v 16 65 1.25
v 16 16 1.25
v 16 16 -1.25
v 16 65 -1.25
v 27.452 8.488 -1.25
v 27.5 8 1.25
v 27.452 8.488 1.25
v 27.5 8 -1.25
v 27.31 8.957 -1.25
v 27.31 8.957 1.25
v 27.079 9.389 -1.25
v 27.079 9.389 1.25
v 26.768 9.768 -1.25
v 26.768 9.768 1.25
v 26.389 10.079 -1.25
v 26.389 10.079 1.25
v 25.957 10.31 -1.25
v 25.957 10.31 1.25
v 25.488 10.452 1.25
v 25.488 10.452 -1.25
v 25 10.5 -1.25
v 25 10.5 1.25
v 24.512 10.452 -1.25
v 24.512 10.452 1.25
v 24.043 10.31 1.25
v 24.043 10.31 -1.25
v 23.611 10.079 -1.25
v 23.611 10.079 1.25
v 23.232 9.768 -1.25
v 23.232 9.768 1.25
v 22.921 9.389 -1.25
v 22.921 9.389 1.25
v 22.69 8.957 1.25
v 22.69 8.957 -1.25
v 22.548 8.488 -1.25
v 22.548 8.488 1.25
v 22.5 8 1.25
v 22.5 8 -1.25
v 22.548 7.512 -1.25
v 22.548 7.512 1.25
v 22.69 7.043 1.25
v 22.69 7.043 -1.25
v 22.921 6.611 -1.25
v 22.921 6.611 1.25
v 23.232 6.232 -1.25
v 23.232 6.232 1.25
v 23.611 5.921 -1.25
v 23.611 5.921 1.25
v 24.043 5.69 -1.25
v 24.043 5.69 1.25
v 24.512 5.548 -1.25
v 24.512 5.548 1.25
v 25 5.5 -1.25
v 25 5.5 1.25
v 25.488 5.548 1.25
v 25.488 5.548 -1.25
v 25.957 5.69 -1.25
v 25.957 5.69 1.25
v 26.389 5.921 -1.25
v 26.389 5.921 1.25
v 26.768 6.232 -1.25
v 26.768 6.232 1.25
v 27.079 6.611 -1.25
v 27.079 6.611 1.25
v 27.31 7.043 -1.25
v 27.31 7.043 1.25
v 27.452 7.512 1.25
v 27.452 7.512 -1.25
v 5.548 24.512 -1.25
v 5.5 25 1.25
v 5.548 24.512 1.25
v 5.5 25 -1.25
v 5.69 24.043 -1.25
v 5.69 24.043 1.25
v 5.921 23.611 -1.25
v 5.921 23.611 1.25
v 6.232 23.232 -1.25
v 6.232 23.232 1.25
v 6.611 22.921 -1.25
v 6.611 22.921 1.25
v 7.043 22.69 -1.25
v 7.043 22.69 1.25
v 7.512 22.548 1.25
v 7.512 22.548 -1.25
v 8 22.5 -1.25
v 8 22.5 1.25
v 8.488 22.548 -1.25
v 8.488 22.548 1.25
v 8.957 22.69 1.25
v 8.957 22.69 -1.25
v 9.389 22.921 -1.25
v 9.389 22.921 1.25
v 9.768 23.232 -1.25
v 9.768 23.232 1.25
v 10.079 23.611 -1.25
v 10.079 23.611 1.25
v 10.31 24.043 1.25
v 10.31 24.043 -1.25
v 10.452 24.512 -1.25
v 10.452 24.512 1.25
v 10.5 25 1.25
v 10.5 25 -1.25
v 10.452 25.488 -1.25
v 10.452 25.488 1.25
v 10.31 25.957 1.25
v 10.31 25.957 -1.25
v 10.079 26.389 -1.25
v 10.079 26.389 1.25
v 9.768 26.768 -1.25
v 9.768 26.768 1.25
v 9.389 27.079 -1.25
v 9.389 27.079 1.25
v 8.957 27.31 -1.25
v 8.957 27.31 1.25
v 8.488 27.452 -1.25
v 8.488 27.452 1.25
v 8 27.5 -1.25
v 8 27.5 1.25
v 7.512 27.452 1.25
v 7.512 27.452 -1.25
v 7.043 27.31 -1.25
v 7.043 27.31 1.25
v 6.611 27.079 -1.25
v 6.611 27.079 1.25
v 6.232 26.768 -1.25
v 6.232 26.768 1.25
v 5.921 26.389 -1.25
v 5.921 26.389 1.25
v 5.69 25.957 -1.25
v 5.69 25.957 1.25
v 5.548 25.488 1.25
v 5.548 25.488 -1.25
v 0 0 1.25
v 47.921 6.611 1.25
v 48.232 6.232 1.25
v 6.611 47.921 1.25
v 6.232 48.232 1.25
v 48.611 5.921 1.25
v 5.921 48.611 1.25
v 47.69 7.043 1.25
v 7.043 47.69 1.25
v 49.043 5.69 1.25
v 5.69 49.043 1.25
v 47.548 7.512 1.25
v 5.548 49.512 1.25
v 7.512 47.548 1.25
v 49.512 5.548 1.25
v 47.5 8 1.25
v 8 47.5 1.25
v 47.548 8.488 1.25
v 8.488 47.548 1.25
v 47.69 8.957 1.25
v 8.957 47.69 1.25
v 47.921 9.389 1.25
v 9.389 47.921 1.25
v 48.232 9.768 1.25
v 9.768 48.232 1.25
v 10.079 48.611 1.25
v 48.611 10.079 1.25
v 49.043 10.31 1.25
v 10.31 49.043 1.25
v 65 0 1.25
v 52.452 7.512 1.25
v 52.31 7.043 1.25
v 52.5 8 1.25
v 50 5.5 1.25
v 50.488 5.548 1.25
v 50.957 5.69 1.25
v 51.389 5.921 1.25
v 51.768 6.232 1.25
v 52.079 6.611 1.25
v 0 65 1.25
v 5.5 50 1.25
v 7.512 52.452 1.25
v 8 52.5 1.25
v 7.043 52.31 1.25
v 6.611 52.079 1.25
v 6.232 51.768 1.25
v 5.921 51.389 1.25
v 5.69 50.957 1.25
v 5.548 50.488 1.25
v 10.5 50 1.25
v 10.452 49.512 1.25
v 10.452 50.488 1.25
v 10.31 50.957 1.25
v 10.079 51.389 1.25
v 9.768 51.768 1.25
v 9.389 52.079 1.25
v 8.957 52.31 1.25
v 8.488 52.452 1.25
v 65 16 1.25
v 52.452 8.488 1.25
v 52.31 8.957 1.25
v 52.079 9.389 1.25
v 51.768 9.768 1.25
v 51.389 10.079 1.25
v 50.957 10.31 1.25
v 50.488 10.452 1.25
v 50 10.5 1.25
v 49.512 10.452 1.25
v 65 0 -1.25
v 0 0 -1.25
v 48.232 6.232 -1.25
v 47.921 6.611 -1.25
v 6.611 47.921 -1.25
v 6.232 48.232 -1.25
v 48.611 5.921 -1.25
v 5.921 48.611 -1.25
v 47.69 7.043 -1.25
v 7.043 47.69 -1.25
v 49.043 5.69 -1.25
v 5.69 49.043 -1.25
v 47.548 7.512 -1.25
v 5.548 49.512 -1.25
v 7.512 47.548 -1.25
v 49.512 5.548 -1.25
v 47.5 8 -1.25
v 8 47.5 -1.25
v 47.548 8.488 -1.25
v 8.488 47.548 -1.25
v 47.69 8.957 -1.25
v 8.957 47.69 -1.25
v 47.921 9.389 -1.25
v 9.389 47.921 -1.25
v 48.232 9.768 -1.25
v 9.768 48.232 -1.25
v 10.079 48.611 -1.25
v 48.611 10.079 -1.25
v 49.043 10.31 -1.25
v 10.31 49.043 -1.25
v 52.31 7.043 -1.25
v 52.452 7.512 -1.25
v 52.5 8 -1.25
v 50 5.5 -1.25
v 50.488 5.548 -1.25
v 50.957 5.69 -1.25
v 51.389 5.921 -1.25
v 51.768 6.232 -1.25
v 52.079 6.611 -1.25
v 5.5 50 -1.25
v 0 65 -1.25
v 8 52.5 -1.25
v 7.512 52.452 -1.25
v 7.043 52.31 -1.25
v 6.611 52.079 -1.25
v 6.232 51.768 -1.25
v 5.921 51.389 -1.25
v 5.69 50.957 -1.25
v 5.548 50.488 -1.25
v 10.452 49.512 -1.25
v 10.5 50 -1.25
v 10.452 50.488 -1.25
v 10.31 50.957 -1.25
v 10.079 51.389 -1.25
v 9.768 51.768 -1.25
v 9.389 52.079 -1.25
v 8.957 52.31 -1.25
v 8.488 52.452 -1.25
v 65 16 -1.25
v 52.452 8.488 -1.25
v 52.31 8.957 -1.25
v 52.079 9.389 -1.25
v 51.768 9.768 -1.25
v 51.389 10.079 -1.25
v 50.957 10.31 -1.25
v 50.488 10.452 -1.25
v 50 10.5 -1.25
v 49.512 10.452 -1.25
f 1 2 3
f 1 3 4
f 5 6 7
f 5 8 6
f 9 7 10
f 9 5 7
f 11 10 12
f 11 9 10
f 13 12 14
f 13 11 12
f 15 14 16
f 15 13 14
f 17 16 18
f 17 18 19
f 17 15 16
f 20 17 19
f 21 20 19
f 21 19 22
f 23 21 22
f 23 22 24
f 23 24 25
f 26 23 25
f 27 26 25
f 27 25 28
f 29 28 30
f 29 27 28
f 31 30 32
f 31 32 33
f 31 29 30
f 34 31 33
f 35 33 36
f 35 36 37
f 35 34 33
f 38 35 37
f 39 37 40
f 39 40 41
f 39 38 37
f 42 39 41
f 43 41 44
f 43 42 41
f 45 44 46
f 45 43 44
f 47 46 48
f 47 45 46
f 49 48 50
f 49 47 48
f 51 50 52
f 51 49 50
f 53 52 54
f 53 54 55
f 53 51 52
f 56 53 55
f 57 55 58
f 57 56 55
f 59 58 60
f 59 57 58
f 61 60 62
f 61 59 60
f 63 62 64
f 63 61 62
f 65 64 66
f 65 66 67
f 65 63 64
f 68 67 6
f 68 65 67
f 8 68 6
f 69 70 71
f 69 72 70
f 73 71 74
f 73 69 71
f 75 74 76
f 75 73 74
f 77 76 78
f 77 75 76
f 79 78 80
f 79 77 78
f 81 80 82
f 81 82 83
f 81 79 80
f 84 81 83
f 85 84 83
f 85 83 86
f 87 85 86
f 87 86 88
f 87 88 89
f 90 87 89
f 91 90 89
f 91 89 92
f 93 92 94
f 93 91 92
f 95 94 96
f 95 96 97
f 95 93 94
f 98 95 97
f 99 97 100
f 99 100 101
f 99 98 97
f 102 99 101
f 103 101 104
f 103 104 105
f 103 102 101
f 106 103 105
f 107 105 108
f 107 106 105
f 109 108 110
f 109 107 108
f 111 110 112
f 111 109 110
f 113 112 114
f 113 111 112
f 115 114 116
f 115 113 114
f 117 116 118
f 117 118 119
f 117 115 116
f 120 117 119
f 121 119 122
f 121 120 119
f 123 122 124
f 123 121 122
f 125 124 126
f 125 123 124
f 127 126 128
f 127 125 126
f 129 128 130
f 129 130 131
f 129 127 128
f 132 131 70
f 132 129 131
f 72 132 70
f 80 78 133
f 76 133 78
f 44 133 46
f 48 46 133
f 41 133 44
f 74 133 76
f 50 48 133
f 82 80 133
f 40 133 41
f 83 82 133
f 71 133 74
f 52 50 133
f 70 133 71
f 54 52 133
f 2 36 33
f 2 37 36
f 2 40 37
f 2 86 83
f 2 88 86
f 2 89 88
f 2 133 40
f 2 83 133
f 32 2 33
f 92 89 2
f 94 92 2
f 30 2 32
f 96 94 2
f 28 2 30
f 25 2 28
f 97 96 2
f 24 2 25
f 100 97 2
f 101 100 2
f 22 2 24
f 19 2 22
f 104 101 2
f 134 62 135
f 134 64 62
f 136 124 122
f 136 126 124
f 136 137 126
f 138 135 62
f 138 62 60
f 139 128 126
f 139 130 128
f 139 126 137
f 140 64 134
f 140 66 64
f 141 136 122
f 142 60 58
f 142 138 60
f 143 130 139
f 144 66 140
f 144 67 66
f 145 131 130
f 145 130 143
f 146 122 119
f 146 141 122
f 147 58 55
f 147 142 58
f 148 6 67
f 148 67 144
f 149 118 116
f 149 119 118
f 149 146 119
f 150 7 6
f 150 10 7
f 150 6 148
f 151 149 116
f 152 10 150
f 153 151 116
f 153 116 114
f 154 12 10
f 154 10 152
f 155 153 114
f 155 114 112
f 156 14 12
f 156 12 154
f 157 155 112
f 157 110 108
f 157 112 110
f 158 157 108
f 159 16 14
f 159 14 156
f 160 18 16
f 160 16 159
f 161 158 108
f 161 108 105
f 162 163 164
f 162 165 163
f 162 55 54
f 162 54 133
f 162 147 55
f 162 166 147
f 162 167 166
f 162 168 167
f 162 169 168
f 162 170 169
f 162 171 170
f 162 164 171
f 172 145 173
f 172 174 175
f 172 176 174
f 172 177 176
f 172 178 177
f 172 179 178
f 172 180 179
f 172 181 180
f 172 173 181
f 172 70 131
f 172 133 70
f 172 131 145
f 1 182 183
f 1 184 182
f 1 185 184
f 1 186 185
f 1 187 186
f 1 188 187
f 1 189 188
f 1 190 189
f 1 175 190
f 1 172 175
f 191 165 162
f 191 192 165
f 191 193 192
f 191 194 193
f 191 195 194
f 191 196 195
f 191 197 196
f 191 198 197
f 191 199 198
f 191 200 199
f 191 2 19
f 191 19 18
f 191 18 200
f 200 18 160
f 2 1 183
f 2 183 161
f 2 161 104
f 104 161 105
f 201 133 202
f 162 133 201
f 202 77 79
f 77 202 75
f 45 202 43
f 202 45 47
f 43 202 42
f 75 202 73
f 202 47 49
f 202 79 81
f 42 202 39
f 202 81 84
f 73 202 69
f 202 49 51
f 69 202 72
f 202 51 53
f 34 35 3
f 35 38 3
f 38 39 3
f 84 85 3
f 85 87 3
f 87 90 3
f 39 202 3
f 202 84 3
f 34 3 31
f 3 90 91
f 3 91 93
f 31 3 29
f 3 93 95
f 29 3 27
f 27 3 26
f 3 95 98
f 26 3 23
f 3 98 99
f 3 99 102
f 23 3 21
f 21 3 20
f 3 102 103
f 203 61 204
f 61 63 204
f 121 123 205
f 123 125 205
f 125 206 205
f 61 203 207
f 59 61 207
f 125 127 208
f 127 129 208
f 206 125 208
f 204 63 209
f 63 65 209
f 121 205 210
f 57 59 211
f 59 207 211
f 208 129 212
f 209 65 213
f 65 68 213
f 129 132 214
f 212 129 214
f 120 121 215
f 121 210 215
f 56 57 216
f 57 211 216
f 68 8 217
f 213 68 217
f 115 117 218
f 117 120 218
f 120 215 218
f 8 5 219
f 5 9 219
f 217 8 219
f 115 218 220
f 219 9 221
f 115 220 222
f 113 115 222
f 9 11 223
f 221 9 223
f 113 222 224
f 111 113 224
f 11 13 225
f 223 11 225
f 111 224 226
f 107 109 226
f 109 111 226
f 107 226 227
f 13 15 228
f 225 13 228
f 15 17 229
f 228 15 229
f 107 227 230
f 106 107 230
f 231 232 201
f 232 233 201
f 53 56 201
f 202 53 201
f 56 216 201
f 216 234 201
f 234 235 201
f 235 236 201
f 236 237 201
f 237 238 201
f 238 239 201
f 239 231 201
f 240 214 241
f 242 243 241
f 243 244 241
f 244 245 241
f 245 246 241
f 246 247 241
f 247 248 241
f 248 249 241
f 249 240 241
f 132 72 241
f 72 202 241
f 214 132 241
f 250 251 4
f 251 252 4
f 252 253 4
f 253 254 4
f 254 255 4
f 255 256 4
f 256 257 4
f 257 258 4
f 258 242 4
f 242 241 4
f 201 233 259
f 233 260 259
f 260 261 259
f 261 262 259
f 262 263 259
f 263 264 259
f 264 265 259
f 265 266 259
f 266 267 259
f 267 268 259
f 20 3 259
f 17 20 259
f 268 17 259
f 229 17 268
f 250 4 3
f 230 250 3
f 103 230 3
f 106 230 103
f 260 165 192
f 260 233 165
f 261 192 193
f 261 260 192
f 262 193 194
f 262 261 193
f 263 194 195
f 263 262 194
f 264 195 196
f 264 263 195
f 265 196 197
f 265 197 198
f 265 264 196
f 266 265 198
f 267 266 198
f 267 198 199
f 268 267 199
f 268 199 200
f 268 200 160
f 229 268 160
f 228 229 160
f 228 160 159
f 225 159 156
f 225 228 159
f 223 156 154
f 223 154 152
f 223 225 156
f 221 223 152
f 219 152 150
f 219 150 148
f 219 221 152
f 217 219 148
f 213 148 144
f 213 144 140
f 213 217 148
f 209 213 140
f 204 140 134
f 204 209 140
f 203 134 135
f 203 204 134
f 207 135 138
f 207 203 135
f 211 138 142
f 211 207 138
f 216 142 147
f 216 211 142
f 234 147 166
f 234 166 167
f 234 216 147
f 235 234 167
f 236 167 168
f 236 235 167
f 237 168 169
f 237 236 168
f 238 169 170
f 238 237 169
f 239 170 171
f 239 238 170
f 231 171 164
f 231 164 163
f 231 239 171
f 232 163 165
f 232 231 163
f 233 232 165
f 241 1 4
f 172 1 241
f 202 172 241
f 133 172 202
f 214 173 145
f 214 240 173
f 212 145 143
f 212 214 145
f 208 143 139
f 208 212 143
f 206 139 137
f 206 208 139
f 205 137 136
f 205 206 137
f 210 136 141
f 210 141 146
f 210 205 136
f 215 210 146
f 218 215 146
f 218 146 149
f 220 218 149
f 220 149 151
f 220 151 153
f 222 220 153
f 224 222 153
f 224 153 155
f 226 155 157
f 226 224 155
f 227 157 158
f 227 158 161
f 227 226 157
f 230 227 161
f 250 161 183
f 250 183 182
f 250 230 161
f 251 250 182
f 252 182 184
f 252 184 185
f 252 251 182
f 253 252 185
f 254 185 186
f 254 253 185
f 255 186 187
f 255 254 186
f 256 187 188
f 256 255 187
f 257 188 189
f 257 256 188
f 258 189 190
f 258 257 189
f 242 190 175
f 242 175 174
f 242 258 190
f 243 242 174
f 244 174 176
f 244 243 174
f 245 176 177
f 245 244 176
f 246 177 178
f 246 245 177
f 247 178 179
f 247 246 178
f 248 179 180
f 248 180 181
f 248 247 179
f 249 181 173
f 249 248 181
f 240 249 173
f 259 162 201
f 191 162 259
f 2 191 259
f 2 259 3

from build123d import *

# Parameters (mm, degrees)
SKETCH1_R           = 2.5
BOSS_EXTRUDE1_DEPTH = 1.25


with BuildPart() as part:
    # Sketch1 → Boss-Extrude1 (new, symmetric)
    with BuildSketch(Plane.XY):
        Polygon((0, 0), (65, 0), (65, 16), (16, 16), (16, 65), (0, 65), align=None)
        with Locations((25, 8)):
            Circle(SKETCH1_R, mode=Mode.SUBTRACT)
        with Locations((50, 8)):
            Circle(SKETCH1_R, mode=Mode.SUBTRACT)
        with Locations(Location((8, 50, 0), (0, 0, 180))):
            Circle(SKETCH1_R, mode=Mode.SUBTRACT)
        with Locations(Location((8, 25, 0), (0, 0, 180))):
            Circle(SKETCH1_R, mode=Mode.SUBTRACT)
    extrude(amount=BOSS_EXTRUDE1_DEPTH, both=True)


solid = part.part
